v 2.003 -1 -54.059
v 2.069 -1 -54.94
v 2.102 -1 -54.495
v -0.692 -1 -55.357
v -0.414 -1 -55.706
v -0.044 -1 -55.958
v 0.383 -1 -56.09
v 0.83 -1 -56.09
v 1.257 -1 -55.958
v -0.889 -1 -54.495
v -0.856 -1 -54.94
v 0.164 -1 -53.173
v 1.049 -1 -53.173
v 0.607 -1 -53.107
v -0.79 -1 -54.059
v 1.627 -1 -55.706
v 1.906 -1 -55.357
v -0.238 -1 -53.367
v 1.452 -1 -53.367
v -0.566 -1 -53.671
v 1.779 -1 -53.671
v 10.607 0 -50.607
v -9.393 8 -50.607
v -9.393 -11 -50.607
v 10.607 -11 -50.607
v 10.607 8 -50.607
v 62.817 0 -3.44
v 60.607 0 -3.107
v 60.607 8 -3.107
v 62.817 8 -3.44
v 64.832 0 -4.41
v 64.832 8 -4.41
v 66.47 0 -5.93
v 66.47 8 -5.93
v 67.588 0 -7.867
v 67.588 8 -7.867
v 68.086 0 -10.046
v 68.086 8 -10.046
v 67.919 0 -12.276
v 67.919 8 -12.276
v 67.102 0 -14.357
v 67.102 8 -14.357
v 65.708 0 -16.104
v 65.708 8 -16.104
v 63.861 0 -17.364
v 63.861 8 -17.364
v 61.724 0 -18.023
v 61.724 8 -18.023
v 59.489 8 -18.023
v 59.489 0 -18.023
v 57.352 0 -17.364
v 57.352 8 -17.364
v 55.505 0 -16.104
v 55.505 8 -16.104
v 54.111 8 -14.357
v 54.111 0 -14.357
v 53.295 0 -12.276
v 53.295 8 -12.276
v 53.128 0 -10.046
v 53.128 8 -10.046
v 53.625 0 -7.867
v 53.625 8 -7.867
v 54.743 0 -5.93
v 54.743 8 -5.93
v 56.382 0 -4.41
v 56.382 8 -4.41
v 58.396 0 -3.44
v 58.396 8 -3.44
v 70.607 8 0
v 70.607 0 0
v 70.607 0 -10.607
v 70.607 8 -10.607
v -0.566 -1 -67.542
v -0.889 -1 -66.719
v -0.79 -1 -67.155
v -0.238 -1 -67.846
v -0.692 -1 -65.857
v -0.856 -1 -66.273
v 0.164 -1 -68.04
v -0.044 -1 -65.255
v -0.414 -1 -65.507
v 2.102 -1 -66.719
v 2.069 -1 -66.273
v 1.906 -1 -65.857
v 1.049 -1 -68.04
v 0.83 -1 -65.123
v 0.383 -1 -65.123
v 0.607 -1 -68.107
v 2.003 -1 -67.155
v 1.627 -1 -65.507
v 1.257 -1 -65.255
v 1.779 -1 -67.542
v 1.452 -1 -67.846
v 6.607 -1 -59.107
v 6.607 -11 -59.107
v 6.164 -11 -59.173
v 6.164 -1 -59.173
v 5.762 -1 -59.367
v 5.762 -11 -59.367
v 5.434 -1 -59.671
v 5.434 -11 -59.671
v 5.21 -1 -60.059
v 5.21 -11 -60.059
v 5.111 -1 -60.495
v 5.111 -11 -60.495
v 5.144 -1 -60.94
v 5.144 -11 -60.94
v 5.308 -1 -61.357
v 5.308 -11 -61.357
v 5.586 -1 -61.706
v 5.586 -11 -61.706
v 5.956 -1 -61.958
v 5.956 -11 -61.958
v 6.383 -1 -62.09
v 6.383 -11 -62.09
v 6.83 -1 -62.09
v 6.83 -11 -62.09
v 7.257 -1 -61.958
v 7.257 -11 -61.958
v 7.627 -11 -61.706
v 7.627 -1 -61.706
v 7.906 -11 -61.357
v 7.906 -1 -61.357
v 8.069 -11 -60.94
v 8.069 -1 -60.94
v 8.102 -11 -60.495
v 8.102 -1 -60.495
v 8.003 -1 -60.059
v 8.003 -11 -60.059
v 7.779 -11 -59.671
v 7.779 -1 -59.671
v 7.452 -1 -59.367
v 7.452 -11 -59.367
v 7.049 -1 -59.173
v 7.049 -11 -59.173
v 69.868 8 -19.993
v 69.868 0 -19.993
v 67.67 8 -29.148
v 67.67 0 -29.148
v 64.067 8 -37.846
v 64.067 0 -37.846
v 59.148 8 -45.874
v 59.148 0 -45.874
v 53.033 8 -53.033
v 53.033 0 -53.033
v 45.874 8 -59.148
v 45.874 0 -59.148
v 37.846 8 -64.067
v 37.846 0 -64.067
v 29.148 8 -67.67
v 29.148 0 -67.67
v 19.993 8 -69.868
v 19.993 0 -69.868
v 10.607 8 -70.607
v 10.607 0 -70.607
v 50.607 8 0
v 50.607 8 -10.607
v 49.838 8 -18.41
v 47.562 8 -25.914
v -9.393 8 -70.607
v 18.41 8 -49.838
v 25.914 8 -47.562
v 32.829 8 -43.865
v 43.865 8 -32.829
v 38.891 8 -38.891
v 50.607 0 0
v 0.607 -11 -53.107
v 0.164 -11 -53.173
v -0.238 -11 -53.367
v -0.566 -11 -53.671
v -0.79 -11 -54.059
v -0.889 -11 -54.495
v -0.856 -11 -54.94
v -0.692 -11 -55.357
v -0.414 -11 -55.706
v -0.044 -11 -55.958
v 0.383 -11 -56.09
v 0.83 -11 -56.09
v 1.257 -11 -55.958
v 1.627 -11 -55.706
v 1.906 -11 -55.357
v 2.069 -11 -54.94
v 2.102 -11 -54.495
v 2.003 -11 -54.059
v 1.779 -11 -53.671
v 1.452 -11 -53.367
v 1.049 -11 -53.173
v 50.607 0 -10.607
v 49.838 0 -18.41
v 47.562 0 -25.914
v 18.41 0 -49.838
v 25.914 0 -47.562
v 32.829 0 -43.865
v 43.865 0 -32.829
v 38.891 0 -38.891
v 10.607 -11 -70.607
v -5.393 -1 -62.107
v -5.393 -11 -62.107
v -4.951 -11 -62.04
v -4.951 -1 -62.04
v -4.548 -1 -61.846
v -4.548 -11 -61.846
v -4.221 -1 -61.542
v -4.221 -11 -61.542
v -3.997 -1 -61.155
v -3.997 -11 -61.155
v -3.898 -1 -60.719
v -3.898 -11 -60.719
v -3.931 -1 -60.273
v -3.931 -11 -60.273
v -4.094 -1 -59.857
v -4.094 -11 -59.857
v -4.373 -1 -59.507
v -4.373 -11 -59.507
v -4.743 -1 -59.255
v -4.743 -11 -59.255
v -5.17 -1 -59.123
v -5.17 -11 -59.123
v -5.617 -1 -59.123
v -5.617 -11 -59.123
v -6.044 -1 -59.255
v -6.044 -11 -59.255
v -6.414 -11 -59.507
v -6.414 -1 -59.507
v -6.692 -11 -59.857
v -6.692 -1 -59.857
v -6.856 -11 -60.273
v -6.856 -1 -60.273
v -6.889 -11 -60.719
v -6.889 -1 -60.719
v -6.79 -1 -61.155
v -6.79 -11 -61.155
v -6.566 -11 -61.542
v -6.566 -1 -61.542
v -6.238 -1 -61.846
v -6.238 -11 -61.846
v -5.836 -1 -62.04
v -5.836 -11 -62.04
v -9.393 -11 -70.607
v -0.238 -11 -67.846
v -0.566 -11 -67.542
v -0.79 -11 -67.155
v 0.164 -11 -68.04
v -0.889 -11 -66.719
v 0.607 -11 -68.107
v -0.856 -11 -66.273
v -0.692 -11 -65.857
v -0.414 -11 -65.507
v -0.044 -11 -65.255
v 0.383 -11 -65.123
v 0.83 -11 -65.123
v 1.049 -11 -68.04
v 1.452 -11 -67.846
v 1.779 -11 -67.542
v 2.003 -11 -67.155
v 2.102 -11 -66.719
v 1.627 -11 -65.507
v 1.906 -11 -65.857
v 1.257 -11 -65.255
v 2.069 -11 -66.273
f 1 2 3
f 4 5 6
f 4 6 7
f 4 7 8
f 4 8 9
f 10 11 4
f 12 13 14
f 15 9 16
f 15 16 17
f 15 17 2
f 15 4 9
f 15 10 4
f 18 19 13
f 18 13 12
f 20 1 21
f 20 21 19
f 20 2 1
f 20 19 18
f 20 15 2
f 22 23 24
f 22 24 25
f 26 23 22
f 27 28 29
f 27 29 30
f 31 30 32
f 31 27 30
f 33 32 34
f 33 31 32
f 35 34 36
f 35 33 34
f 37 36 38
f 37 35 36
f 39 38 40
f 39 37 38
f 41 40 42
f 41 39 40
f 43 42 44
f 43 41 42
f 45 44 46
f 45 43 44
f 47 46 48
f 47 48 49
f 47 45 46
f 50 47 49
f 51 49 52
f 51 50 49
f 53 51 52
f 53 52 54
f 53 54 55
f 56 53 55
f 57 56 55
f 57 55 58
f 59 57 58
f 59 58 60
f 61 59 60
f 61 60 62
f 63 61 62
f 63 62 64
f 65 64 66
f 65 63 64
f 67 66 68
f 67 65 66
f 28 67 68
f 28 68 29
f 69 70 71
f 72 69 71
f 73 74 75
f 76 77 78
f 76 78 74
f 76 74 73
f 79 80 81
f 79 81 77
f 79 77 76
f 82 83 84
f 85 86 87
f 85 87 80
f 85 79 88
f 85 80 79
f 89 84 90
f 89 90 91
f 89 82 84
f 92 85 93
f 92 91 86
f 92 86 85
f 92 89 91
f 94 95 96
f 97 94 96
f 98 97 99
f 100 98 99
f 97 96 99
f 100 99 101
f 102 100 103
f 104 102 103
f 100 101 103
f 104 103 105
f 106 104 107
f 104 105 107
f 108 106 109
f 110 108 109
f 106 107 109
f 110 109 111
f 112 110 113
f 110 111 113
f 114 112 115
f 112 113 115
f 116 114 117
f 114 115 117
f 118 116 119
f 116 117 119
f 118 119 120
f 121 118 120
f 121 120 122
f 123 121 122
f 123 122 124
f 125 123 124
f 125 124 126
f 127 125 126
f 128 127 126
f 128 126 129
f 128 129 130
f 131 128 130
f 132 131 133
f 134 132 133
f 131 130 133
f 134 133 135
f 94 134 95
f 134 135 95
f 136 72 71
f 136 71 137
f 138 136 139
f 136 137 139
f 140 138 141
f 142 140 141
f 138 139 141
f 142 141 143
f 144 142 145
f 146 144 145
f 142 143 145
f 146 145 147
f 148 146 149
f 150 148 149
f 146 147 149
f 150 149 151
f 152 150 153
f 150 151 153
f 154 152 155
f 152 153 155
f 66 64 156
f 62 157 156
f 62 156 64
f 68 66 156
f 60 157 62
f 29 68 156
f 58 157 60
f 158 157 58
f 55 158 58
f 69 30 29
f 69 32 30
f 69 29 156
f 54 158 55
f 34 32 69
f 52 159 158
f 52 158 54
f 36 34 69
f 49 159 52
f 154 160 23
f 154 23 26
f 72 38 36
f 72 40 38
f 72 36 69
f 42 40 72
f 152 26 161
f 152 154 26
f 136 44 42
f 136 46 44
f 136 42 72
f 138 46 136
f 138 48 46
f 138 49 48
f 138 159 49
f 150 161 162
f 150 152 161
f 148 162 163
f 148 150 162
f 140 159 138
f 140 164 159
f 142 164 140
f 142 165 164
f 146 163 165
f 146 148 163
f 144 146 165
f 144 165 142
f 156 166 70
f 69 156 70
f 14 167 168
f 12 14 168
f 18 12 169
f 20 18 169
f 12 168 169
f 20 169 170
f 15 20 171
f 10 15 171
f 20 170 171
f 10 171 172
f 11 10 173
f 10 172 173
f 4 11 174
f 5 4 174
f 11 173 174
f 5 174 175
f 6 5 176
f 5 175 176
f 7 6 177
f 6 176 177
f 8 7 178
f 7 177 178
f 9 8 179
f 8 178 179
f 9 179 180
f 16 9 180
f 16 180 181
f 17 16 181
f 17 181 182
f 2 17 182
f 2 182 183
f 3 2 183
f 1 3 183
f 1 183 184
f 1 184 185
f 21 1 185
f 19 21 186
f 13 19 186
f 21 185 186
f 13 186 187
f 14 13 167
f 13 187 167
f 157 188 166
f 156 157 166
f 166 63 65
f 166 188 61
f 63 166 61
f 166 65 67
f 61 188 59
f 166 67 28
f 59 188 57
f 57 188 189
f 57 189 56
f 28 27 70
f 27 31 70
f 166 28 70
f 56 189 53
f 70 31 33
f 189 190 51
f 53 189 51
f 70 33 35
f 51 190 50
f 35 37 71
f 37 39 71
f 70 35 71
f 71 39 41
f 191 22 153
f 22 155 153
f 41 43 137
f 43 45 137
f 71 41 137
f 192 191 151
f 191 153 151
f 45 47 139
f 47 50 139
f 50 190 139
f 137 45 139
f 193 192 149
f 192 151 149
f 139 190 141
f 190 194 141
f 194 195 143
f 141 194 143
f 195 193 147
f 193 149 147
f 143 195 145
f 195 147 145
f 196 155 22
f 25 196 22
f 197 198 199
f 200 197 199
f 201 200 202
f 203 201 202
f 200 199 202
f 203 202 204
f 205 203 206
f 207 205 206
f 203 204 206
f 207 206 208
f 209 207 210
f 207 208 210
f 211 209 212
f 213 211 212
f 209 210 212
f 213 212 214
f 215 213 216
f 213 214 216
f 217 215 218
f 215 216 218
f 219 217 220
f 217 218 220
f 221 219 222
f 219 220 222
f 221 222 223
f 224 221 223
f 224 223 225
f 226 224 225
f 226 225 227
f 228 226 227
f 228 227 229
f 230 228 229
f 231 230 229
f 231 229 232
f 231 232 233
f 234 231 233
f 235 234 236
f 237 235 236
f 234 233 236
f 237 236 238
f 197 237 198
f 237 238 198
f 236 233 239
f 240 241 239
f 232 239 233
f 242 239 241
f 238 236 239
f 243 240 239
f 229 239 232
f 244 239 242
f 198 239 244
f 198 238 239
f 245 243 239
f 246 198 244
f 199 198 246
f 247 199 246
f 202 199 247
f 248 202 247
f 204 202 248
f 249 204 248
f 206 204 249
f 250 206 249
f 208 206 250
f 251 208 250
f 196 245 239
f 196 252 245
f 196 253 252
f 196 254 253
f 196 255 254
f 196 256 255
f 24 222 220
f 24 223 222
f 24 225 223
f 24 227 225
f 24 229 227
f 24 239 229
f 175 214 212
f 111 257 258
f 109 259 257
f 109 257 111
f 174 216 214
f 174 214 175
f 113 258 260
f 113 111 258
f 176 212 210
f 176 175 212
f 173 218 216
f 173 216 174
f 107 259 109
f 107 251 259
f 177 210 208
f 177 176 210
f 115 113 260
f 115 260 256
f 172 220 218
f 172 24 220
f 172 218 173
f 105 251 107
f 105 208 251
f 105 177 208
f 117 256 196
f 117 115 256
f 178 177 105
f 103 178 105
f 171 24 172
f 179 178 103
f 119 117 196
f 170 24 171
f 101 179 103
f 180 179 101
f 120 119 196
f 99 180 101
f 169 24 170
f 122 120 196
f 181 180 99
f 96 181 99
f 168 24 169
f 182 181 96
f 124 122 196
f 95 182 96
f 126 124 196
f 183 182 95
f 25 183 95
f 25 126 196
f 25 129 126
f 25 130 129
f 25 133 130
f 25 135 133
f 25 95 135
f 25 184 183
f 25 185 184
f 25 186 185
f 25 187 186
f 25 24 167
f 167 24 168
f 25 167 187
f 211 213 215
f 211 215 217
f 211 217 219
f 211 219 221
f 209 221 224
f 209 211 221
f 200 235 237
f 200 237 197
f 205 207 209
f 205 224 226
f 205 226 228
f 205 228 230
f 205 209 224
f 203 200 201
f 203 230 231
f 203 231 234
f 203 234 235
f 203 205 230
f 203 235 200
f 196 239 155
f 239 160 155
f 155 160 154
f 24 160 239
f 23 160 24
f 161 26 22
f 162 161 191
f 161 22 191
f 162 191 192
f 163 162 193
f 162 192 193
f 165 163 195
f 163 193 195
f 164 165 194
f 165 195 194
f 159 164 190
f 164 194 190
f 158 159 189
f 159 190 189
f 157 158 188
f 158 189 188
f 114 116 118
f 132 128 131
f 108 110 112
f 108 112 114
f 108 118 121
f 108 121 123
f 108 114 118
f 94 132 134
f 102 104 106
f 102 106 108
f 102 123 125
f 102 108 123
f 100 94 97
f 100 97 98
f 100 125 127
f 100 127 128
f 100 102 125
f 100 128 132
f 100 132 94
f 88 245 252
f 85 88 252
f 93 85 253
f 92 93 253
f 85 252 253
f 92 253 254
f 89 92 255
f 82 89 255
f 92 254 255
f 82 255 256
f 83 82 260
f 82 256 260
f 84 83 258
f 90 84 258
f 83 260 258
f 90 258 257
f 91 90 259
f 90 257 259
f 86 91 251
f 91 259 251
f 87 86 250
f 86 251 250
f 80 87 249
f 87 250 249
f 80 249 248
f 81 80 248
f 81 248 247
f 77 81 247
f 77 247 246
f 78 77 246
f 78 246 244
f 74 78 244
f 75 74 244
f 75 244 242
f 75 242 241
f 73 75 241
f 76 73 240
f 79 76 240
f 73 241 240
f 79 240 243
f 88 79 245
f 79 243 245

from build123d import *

# Parameters (mm, degrees)
SKETCH1_R               = 7.5
BOSS_EXTRUDE1_DEPTH     = 8
CROQUIS6_W              = 20
CROQUIS6_H              = 20
SALIENTE_EXTRUIR5_DEPTH = 11
CROQUIS7_R              = 1.5
CORTAR_EXTRUIR1_DEPTH   = 10


with BuildPart() as part:
    # Sketch1 → Boss-Extrude1 (new body)
    with BuildSketch(Plane(origin=(0, 0, 0), x_dir=(1, 0, 0), z_dir=(0, 1, 0))):
        with BuildLine():
            Line((50.606601718, 10.606601718), (50.606601718, 0))
            Line((50.606601718, 0), (70.606601718, 0))
            Line((70.606601718, 0), (70.606601718, 10.606601718))
            ThreePointArc((70.606601718, 10.606601718), (53.033008589, 53.033008589), (10.606601718, 70.606601718))
            Line((10.606601718, 70.606601718), (-9.393398282, 70.606601718))
            Line((-9.393398282, 70.606601718), (-9.393398282, 50.606601718))
            Line((-9.393398282, 50.606601718), (10.606601718, 50.606601718))
            ThreePointArc((10.606601718, 50.606601718), (38.890872965, 38.890872965), (50.606601718, 10.606601718))
        make_face()
        with Locations(Location((60.606601718, 10.606601718, 0), (0, 0, 270))):
            Circle(SKETCH1_R, mode=Mode.SUBTRACT)
    extrude(amount=BOSS_EXTRUDE1_DEPTH)

    # Croquis6 → Saliente-Extruir5 (add)
    with BuildSketch(Plane.XZ):
        with Locations((0.606601718, -60.606601718)):
            Rectangle(CROQUIS6_W, CROQUIS6_H)
    extrude(amount=SALIENTE_EXTRUIR5_DEPTH)

    # Croquis7 → Cortar-Extruir1 (cut)
    with BuildSketch(Plane.XZ.offset(11)):
        with Locations(Location((-5.393398282, -60.606601718, 0), (0, 0, 270))):
            Circle(CROQUIS7_R)
        with Locations(Location((6.606601718, -60.606601718, 0), (0, 0, 90))):
            Circle(CROQUIS7_R)
        with Locations(Location((0.606601718, -66.606601718, 0), (0, 0, 270))):
            Circle(CROQUIS7_R)
        with Locations(Location((0.606601718, -54.606601718, 0), (0, 0, 90))):
            Circle(CROQUIS7_R)
    extrude(amount=-CORTAR_EXTRUIR1_DEPTH, mode=Mode.SUBTRACT)


solid = part.part
